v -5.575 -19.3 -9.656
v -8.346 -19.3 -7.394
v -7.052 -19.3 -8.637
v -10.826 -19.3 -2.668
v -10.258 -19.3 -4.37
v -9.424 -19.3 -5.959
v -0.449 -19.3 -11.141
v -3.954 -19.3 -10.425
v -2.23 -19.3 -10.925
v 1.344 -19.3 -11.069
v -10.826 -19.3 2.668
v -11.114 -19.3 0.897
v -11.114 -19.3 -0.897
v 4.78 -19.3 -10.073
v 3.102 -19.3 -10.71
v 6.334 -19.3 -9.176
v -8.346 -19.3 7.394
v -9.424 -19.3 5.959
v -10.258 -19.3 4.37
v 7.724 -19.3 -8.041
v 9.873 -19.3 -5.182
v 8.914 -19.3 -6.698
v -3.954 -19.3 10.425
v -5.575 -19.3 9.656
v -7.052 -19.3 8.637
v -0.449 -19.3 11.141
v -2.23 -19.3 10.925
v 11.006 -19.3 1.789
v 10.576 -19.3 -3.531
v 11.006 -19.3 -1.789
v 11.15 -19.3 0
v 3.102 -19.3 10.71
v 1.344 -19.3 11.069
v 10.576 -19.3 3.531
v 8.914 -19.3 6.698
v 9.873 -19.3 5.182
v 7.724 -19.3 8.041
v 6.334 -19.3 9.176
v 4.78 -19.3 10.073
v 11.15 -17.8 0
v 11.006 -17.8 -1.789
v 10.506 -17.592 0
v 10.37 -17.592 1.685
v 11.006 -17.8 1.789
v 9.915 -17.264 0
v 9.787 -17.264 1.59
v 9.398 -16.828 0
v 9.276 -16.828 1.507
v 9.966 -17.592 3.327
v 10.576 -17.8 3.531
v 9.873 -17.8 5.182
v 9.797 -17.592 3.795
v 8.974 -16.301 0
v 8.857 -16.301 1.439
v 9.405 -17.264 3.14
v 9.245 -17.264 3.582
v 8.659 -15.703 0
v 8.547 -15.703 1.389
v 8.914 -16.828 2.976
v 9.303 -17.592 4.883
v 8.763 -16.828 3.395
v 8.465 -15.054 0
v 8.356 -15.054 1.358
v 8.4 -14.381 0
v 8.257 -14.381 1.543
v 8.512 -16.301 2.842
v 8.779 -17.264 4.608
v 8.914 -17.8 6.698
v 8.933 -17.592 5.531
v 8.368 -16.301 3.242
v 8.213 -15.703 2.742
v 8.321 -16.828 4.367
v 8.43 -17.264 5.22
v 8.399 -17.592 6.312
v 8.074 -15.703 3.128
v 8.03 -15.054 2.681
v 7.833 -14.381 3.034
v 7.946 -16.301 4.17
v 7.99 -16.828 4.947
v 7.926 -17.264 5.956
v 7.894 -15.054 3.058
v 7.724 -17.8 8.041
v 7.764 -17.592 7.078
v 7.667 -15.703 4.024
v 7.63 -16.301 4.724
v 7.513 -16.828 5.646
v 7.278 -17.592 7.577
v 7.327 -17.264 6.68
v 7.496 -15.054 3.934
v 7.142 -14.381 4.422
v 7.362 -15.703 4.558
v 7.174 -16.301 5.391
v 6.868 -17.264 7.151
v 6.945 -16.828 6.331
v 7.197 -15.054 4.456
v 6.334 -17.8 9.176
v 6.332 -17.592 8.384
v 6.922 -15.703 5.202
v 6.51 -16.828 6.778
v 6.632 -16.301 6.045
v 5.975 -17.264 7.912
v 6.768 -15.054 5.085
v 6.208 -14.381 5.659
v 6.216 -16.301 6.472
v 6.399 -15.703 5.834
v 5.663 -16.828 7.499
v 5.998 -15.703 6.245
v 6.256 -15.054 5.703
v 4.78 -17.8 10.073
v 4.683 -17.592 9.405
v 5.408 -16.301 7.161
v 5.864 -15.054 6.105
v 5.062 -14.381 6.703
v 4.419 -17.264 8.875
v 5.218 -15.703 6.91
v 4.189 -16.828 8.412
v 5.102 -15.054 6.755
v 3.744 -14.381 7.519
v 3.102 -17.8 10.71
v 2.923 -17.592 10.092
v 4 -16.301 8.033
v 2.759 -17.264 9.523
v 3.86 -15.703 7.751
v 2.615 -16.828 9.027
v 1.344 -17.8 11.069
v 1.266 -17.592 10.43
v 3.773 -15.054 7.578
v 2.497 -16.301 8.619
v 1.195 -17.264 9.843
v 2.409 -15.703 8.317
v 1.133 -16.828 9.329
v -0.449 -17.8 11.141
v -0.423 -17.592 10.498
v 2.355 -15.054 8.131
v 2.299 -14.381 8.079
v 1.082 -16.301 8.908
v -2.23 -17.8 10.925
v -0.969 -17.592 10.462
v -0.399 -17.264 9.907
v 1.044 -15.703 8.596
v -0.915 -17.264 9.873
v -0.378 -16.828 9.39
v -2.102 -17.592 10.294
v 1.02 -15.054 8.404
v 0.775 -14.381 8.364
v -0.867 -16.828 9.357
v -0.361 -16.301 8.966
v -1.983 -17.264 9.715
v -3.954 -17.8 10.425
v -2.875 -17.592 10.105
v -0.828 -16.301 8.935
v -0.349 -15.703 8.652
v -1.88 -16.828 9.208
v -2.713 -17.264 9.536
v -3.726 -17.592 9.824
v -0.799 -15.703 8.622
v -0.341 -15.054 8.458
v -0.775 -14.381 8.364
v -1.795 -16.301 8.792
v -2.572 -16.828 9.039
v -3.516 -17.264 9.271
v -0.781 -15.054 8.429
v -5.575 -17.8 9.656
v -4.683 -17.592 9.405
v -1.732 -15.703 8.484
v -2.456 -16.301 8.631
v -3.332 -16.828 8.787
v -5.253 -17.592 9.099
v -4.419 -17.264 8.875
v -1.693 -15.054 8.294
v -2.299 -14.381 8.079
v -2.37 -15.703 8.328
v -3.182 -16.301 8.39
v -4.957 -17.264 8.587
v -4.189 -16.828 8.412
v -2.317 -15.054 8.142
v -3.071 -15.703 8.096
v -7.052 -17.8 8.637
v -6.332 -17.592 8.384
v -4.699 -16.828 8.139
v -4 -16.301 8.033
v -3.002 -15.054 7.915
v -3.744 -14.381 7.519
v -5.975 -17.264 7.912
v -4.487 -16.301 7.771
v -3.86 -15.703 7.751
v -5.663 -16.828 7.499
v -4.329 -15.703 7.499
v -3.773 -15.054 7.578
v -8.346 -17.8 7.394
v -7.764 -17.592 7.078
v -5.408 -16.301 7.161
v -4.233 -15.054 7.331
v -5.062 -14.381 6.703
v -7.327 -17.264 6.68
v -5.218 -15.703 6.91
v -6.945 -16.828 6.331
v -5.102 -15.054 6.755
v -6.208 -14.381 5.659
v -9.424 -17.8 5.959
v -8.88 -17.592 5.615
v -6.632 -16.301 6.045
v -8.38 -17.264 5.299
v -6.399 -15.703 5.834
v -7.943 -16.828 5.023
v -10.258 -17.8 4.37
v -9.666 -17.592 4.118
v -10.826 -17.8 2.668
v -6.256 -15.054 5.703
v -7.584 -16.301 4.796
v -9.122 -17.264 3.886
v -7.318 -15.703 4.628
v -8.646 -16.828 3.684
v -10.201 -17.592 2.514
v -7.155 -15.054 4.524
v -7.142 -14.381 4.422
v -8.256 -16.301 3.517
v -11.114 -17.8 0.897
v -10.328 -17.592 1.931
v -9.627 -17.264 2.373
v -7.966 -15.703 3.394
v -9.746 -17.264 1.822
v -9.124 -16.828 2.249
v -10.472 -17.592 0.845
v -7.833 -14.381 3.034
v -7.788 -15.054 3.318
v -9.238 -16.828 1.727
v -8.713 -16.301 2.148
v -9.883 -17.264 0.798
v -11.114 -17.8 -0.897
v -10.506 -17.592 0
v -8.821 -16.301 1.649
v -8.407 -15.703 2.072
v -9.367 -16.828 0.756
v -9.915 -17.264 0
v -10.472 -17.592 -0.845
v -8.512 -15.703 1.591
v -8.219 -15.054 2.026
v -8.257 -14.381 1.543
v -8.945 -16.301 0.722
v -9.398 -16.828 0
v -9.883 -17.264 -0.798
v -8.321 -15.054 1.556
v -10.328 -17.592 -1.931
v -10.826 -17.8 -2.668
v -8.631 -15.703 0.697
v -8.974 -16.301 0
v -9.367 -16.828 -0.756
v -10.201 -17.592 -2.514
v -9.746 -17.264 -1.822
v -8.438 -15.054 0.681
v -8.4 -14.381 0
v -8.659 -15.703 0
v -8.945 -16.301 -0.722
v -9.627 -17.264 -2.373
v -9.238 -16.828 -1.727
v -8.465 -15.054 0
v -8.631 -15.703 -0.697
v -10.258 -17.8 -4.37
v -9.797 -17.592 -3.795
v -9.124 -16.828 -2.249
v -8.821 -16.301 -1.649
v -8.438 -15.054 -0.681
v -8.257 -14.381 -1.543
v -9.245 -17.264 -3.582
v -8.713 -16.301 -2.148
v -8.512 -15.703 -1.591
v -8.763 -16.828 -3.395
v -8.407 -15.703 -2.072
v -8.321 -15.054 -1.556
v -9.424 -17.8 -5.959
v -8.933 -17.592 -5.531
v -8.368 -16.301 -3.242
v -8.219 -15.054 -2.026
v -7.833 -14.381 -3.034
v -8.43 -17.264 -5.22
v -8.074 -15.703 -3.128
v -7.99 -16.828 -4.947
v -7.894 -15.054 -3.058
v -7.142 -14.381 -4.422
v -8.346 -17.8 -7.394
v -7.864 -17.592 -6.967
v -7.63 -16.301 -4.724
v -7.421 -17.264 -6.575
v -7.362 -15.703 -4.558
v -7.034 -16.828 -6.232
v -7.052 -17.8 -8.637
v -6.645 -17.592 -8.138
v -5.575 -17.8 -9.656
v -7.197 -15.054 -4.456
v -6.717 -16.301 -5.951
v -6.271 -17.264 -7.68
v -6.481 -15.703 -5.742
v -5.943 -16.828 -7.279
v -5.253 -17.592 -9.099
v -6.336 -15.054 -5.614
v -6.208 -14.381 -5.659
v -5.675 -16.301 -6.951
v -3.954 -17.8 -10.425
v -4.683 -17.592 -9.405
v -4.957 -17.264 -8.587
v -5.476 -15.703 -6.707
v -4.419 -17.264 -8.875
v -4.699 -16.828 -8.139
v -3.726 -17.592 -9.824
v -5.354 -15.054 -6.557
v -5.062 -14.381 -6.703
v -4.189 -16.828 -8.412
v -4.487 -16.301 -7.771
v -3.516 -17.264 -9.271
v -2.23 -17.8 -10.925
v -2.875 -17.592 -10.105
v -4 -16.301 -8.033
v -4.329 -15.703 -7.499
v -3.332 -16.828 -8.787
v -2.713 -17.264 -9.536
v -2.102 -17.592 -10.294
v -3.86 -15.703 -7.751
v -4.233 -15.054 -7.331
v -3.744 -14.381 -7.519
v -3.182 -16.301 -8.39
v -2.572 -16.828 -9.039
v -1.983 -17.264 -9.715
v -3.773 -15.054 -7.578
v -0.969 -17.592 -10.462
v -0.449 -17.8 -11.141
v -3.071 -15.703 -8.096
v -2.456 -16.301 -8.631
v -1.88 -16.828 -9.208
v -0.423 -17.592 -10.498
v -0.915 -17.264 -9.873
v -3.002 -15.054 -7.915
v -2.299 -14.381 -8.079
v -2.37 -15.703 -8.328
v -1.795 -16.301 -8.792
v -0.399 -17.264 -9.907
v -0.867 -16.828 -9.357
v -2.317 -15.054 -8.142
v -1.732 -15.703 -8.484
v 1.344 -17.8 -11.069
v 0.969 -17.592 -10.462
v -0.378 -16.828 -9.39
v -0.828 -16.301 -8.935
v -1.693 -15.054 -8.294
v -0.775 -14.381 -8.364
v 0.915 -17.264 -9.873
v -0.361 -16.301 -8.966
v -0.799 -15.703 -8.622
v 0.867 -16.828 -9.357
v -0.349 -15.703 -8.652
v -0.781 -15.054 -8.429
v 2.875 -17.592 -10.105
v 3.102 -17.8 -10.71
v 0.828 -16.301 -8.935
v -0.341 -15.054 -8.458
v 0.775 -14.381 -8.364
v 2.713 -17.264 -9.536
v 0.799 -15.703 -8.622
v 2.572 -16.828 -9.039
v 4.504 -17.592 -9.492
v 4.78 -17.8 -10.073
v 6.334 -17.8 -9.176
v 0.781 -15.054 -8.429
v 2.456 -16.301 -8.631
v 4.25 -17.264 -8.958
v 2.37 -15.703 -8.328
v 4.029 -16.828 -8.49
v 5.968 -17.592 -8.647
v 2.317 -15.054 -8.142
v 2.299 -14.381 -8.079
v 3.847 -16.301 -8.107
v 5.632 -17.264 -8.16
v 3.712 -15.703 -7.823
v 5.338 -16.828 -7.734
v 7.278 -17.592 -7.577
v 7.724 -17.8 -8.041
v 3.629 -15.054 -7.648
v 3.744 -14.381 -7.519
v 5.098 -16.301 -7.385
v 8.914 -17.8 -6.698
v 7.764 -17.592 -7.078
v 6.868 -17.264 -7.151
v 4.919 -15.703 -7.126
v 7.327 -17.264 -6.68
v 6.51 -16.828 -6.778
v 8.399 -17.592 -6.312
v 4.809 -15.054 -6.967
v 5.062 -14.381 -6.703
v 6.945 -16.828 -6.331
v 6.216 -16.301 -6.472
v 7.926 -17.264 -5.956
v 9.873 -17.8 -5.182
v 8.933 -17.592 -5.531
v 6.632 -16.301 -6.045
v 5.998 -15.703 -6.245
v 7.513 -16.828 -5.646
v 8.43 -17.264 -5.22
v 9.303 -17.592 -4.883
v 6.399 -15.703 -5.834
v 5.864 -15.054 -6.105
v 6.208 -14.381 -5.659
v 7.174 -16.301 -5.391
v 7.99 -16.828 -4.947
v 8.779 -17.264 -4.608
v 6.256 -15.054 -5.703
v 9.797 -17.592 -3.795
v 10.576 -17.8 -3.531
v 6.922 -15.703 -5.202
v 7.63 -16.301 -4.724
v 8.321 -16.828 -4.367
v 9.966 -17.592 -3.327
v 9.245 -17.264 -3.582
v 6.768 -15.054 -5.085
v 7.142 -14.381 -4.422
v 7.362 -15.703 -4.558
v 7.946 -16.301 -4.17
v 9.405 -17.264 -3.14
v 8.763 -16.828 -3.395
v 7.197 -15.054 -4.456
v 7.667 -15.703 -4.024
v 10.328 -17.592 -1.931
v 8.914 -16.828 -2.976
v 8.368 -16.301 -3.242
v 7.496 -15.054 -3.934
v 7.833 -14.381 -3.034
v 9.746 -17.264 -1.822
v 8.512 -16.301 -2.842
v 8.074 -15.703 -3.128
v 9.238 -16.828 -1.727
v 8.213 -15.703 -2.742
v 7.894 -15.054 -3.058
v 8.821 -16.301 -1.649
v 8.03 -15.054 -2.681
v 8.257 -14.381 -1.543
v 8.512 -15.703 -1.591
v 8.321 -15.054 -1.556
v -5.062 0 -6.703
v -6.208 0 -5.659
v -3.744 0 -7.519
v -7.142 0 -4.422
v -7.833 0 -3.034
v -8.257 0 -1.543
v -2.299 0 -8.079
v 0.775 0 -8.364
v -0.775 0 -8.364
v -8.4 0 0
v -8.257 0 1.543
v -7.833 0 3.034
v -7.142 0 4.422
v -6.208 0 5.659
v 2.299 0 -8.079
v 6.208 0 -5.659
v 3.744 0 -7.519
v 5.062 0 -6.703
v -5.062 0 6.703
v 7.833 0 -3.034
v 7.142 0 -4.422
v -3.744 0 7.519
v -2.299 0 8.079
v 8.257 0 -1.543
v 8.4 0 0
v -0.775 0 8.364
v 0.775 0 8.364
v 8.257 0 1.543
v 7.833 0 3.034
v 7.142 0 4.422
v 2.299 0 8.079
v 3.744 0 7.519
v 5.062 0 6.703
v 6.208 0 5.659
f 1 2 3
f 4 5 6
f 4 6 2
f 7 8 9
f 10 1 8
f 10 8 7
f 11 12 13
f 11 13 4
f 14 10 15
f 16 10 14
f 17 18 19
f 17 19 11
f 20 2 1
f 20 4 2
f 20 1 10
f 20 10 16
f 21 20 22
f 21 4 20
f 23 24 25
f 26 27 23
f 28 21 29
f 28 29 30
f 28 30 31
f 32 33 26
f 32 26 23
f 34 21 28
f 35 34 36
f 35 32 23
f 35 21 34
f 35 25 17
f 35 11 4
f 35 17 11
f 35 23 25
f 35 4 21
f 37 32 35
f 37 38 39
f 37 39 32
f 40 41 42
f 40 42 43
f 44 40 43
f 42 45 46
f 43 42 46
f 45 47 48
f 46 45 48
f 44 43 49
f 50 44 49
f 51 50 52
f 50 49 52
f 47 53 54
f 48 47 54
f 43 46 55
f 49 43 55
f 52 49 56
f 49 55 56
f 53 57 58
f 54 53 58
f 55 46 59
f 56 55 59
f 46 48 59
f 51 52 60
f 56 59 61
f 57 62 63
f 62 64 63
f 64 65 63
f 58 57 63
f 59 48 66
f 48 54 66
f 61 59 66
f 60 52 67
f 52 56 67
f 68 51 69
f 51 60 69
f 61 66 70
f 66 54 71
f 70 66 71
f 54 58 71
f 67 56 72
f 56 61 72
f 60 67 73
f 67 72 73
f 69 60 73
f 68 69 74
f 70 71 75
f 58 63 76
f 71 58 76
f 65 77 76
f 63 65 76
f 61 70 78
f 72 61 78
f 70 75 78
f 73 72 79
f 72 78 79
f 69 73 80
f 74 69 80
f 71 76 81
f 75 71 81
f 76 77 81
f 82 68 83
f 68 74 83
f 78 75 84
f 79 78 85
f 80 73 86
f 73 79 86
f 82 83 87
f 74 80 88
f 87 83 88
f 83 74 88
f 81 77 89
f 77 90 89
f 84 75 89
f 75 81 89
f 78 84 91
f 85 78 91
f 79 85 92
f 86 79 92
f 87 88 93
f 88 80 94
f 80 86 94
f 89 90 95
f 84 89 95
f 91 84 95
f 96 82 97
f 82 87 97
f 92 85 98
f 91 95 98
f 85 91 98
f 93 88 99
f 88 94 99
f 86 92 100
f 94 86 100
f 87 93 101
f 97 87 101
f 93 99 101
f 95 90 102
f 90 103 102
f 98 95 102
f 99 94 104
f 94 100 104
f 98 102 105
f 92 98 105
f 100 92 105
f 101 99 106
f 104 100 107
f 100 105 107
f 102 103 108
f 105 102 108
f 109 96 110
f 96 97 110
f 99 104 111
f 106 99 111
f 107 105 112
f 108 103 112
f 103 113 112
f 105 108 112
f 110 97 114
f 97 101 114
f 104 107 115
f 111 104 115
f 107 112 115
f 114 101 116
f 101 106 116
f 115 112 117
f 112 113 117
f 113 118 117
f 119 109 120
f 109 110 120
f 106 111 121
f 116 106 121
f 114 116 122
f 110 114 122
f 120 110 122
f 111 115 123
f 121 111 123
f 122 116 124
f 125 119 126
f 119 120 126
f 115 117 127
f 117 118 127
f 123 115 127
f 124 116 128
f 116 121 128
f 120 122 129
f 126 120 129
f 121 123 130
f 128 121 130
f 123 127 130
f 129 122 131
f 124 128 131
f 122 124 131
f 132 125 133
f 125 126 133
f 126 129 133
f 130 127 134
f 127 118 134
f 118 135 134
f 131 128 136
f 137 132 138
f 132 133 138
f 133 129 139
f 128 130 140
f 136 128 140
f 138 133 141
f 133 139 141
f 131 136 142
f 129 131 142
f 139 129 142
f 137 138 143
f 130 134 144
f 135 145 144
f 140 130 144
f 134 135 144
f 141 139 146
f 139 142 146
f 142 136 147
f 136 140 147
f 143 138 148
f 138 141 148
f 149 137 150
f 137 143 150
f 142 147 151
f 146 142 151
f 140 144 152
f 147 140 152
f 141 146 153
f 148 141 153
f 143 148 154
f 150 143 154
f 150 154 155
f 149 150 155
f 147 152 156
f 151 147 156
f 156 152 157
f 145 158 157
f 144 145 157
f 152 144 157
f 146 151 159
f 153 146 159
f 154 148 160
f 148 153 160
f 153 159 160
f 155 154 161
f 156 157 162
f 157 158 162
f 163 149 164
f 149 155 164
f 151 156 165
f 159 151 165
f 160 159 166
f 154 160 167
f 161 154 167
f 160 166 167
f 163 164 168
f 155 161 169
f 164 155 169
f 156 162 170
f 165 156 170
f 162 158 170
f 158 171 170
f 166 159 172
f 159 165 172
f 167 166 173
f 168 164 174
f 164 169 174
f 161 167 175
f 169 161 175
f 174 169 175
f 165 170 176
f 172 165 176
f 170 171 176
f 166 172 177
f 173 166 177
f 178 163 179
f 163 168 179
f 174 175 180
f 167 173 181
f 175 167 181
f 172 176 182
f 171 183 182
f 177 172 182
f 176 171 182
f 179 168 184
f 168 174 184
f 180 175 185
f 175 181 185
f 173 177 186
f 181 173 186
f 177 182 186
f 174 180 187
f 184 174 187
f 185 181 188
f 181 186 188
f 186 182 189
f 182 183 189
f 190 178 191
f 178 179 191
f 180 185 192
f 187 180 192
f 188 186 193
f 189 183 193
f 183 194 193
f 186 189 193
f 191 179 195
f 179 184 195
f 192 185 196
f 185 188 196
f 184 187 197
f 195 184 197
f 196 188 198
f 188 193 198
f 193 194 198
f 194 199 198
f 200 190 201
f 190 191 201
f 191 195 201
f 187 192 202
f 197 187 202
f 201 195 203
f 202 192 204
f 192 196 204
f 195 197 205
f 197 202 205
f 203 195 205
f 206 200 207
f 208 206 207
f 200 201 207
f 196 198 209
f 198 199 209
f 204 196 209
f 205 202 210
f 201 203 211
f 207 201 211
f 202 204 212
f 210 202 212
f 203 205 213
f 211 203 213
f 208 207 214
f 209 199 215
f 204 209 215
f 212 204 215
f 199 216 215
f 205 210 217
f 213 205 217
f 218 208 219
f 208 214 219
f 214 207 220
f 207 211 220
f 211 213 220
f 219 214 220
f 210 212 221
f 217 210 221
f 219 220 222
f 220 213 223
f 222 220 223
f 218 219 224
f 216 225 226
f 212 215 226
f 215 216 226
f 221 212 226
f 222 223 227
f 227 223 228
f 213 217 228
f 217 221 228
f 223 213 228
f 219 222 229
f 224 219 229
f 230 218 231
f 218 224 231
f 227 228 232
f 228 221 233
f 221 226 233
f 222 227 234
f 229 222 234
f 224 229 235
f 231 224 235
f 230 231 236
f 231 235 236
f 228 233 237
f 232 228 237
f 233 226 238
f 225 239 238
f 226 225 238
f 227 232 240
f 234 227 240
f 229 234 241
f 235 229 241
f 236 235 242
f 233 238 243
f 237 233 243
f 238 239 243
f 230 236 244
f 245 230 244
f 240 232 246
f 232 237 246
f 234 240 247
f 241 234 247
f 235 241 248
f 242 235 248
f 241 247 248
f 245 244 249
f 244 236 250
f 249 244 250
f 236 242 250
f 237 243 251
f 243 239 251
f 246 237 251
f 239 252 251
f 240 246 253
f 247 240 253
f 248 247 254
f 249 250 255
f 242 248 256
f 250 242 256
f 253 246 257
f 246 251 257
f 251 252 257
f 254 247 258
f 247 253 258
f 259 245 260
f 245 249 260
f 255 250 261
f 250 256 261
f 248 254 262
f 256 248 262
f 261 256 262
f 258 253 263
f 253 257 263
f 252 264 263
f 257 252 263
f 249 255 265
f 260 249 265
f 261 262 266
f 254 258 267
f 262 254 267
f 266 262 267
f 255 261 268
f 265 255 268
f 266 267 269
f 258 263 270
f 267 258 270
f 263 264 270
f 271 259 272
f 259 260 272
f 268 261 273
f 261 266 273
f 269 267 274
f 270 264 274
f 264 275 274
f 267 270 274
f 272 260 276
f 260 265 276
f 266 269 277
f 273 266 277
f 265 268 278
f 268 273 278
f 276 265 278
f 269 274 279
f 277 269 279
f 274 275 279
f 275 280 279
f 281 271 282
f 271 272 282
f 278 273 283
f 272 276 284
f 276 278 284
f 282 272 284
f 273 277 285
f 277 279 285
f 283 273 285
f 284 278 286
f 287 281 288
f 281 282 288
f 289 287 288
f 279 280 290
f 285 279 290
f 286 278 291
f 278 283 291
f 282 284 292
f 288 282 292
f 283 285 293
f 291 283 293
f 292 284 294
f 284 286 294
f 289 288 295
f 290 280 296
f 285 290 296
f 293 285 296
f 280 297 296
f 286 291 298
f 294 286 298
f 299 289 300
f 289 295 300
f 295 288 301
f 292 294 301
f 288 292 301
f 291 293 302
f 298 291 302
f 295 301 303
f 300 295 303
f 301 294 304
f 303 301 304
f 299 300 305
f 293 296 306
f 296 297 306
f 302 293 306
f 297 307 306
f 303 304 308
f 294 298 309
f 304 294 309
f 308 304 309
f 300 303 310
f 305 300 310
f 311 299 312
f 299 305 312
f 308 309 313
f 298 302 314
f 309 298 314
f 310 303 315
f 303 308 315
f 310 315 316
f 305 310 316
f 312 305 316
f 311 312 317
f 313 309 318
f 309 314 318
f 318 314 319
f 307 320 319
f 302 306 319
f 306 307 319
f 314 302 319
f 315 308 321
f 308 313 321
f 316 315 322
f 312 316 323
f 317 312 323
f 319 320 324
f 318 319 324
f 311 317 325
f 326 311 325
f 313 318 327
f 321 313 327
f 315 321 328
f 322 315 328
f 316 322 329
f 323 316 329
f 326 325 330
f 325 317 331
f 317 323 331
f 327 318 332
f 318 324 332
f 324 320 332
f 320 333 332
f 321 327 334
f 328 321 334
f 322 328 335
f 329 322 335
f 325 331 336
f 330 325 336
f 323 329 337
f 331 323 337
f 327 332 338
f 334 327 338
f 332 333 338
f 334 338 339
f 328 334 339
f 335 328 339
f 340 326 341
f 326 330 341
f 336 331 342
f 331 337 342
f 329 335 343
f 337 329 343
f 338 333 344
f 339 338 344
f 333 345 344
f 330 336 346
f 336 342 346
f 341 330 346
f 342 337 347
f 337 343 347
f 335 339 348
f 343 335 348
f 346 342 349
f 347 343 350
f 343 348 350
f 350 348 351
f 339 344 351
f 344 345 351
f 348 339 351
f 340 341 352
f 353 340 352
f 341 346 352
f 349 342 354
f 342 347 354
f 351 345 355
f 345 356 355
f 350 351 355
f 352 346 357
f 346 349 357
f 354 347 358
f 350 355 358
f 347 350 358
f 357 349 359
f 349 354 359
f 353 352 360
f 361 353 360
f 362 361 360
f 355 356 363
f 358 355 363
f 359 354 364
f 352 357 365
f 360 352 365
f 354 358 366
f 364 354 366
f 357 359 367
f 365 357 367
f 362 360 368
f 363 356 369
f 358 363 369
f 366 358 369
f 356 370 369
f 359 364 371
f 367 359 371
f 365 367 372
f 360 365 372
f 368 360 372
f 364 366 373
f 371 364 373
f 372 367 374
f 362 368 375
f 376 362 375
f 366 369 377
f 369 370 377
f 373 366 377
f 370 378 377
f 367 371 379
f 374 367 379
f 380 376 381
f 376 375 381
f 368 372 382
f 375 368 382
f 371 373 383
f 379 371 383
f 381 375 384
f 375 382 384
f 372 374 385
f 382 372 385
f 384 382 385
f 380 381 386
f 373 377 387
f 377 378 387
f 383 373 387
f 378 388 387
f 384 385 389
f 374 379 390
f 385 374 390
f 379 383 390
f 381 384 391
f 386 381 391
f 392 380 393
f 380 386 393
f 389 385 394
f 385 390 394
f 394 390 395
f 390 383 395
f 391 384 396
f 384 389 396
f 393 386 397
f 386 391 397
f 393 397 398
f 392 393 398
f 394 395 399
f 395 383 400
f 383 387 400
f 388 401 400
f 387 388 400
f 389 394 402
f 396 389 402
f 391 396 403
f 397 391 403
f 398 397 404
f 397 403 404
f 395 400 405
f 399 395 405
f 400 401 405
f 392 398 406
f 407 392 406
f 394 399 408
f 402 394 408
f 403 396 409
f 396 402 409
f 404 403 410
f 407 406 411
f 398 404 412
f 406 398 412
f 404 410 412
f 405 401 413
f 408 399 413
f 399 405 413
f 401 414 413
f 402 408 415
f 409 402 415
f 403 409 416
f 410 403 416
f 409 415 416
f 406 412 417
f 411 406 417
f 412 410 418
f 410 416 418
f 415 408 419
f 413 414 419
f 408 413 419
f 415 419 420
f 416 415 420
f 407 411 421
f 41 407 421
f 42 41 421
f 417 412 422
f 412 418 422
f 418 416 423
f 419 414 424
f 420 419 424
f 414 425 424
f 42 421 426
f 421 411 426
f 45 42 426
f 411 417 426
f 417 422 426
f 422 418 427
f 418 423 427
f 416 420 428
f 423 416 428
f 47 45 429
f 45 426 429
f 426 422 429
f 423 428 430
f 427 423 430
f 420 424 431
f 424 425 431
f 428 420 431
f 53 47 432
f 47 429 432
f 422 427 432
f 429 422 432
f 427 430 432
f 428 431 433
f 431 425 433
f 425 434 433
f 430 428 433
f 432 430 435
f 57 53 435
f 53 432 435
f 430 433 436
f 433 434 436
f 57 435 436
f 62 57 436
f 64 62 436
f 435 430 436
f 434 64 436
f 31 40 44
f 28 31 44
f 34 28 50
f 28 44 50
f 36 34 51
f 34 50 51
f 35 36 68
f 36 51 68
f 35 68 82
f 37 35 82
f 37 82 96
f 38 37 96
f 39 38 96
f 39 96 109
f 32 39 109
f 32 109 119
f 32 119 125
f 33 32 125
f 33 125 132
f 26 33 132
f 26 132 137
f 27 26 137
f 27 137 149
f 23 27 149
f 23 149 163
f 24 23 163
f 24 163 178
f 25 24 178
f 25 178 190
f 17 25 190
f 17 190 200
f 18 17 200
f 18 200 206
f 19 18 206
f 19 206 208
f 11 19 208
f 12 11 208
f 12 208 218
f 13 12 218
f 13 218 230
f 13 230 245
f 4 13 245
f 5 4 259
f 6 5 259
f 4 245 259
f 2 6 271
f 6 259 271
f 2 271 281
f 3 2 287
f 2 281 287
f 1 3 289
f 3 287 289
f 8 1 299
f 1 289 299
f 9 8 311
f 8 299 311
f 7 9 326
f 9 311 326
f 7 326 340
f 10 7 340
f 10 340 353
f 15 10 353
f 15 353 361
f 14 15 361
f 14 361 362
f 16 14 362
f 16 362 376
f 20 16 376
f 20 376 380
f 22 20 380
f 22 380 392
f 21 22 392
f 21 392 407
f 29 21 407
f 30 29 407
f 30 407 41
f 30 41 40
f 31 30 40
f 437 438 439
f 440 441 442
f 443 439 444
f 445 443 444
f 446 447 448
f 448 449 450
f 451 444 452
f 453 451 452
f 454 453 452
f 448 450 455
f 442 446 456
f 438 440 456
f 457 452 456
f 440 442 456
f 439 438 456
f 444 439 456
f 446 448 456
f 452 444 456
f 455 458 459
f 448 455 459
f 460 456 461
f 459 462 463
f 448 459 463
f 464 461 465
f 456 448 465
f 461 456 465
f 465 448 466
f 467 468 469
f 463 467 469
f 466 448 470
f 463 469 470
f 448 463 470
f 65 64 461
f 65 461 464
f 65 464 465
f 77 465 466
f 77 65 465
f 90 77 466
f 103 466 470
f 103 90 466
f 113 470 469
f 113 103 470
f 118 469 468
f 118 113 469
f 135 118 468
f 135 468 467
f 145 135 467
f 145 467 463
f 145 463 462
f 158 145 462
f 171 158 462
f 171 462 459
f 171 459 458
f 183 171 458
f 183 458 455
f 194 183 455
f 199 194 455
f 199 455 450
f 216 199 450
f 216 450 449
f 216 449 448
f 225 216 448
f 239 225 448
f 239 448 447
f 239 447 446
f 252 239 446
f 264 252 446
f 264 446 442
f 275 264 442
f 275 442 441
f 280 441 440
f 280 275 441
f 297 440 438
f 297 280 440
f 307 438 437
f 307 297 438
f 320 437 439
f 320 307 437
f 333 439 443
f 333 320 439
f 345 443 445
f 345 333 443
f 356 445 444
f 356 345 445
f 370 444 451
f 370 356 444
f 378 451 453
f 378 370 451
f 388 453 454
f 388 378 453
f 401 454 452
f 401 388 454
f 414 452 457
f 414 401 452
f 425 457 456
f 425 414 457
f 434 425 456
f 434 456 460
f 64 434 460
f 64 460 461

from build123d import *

# Parameters (mm, degrees)
F0_R     = 11.15
F1_DEPTH = 19.3
F3_START = -1.5
F2_R     = 11.15
F2_R_2   = 8.4
F3_DEPTH = 17.8


# Not quite as in the source:
# - a fillet or chamfer that OpenCascade refuses, or shapes differently, is made with other operations: its cross-section is extruded or revolved along the edge and cut away or added


with BuildPart() as f1:
    # F0 (on Front) → F1 (new body)
    with BuildSketch(Plane.XZ):
        Circle(F0_R)
    extrude(amount=F1_DEPTH)

    # F2 (on face) → F3 (cut)
    with BuildSketch(Plane.XZ.offset(19.3).offset(F3_START)):
        Circle(F2_R)
        Circle(F2_R_2, mode=Mode.SUBTRACT)
    extrude(amount=-F3_DEPTH, mode=Mode.SUBTRACT)

    # F4: fillet of radius 3.5 on 1 edges, made by hand

    # F4_s1 → F4_t2 (revolve)
    with BuildSketch(Plane.XY):
        with BuildLine():
            ThreePointArc((11.15, -17.8), (9.1728219713, -16.5750425141), (8.4, -14.3813014172))
            Line((8.4, -14.3813014172), (8.4, -17.8))
            Line((8.4, -17.8), (11.15, -17.8))
        make_face()
    revolve(axis=Axis((0, -17.8, 0), (0, -1, 0)))


solid = f1.part
